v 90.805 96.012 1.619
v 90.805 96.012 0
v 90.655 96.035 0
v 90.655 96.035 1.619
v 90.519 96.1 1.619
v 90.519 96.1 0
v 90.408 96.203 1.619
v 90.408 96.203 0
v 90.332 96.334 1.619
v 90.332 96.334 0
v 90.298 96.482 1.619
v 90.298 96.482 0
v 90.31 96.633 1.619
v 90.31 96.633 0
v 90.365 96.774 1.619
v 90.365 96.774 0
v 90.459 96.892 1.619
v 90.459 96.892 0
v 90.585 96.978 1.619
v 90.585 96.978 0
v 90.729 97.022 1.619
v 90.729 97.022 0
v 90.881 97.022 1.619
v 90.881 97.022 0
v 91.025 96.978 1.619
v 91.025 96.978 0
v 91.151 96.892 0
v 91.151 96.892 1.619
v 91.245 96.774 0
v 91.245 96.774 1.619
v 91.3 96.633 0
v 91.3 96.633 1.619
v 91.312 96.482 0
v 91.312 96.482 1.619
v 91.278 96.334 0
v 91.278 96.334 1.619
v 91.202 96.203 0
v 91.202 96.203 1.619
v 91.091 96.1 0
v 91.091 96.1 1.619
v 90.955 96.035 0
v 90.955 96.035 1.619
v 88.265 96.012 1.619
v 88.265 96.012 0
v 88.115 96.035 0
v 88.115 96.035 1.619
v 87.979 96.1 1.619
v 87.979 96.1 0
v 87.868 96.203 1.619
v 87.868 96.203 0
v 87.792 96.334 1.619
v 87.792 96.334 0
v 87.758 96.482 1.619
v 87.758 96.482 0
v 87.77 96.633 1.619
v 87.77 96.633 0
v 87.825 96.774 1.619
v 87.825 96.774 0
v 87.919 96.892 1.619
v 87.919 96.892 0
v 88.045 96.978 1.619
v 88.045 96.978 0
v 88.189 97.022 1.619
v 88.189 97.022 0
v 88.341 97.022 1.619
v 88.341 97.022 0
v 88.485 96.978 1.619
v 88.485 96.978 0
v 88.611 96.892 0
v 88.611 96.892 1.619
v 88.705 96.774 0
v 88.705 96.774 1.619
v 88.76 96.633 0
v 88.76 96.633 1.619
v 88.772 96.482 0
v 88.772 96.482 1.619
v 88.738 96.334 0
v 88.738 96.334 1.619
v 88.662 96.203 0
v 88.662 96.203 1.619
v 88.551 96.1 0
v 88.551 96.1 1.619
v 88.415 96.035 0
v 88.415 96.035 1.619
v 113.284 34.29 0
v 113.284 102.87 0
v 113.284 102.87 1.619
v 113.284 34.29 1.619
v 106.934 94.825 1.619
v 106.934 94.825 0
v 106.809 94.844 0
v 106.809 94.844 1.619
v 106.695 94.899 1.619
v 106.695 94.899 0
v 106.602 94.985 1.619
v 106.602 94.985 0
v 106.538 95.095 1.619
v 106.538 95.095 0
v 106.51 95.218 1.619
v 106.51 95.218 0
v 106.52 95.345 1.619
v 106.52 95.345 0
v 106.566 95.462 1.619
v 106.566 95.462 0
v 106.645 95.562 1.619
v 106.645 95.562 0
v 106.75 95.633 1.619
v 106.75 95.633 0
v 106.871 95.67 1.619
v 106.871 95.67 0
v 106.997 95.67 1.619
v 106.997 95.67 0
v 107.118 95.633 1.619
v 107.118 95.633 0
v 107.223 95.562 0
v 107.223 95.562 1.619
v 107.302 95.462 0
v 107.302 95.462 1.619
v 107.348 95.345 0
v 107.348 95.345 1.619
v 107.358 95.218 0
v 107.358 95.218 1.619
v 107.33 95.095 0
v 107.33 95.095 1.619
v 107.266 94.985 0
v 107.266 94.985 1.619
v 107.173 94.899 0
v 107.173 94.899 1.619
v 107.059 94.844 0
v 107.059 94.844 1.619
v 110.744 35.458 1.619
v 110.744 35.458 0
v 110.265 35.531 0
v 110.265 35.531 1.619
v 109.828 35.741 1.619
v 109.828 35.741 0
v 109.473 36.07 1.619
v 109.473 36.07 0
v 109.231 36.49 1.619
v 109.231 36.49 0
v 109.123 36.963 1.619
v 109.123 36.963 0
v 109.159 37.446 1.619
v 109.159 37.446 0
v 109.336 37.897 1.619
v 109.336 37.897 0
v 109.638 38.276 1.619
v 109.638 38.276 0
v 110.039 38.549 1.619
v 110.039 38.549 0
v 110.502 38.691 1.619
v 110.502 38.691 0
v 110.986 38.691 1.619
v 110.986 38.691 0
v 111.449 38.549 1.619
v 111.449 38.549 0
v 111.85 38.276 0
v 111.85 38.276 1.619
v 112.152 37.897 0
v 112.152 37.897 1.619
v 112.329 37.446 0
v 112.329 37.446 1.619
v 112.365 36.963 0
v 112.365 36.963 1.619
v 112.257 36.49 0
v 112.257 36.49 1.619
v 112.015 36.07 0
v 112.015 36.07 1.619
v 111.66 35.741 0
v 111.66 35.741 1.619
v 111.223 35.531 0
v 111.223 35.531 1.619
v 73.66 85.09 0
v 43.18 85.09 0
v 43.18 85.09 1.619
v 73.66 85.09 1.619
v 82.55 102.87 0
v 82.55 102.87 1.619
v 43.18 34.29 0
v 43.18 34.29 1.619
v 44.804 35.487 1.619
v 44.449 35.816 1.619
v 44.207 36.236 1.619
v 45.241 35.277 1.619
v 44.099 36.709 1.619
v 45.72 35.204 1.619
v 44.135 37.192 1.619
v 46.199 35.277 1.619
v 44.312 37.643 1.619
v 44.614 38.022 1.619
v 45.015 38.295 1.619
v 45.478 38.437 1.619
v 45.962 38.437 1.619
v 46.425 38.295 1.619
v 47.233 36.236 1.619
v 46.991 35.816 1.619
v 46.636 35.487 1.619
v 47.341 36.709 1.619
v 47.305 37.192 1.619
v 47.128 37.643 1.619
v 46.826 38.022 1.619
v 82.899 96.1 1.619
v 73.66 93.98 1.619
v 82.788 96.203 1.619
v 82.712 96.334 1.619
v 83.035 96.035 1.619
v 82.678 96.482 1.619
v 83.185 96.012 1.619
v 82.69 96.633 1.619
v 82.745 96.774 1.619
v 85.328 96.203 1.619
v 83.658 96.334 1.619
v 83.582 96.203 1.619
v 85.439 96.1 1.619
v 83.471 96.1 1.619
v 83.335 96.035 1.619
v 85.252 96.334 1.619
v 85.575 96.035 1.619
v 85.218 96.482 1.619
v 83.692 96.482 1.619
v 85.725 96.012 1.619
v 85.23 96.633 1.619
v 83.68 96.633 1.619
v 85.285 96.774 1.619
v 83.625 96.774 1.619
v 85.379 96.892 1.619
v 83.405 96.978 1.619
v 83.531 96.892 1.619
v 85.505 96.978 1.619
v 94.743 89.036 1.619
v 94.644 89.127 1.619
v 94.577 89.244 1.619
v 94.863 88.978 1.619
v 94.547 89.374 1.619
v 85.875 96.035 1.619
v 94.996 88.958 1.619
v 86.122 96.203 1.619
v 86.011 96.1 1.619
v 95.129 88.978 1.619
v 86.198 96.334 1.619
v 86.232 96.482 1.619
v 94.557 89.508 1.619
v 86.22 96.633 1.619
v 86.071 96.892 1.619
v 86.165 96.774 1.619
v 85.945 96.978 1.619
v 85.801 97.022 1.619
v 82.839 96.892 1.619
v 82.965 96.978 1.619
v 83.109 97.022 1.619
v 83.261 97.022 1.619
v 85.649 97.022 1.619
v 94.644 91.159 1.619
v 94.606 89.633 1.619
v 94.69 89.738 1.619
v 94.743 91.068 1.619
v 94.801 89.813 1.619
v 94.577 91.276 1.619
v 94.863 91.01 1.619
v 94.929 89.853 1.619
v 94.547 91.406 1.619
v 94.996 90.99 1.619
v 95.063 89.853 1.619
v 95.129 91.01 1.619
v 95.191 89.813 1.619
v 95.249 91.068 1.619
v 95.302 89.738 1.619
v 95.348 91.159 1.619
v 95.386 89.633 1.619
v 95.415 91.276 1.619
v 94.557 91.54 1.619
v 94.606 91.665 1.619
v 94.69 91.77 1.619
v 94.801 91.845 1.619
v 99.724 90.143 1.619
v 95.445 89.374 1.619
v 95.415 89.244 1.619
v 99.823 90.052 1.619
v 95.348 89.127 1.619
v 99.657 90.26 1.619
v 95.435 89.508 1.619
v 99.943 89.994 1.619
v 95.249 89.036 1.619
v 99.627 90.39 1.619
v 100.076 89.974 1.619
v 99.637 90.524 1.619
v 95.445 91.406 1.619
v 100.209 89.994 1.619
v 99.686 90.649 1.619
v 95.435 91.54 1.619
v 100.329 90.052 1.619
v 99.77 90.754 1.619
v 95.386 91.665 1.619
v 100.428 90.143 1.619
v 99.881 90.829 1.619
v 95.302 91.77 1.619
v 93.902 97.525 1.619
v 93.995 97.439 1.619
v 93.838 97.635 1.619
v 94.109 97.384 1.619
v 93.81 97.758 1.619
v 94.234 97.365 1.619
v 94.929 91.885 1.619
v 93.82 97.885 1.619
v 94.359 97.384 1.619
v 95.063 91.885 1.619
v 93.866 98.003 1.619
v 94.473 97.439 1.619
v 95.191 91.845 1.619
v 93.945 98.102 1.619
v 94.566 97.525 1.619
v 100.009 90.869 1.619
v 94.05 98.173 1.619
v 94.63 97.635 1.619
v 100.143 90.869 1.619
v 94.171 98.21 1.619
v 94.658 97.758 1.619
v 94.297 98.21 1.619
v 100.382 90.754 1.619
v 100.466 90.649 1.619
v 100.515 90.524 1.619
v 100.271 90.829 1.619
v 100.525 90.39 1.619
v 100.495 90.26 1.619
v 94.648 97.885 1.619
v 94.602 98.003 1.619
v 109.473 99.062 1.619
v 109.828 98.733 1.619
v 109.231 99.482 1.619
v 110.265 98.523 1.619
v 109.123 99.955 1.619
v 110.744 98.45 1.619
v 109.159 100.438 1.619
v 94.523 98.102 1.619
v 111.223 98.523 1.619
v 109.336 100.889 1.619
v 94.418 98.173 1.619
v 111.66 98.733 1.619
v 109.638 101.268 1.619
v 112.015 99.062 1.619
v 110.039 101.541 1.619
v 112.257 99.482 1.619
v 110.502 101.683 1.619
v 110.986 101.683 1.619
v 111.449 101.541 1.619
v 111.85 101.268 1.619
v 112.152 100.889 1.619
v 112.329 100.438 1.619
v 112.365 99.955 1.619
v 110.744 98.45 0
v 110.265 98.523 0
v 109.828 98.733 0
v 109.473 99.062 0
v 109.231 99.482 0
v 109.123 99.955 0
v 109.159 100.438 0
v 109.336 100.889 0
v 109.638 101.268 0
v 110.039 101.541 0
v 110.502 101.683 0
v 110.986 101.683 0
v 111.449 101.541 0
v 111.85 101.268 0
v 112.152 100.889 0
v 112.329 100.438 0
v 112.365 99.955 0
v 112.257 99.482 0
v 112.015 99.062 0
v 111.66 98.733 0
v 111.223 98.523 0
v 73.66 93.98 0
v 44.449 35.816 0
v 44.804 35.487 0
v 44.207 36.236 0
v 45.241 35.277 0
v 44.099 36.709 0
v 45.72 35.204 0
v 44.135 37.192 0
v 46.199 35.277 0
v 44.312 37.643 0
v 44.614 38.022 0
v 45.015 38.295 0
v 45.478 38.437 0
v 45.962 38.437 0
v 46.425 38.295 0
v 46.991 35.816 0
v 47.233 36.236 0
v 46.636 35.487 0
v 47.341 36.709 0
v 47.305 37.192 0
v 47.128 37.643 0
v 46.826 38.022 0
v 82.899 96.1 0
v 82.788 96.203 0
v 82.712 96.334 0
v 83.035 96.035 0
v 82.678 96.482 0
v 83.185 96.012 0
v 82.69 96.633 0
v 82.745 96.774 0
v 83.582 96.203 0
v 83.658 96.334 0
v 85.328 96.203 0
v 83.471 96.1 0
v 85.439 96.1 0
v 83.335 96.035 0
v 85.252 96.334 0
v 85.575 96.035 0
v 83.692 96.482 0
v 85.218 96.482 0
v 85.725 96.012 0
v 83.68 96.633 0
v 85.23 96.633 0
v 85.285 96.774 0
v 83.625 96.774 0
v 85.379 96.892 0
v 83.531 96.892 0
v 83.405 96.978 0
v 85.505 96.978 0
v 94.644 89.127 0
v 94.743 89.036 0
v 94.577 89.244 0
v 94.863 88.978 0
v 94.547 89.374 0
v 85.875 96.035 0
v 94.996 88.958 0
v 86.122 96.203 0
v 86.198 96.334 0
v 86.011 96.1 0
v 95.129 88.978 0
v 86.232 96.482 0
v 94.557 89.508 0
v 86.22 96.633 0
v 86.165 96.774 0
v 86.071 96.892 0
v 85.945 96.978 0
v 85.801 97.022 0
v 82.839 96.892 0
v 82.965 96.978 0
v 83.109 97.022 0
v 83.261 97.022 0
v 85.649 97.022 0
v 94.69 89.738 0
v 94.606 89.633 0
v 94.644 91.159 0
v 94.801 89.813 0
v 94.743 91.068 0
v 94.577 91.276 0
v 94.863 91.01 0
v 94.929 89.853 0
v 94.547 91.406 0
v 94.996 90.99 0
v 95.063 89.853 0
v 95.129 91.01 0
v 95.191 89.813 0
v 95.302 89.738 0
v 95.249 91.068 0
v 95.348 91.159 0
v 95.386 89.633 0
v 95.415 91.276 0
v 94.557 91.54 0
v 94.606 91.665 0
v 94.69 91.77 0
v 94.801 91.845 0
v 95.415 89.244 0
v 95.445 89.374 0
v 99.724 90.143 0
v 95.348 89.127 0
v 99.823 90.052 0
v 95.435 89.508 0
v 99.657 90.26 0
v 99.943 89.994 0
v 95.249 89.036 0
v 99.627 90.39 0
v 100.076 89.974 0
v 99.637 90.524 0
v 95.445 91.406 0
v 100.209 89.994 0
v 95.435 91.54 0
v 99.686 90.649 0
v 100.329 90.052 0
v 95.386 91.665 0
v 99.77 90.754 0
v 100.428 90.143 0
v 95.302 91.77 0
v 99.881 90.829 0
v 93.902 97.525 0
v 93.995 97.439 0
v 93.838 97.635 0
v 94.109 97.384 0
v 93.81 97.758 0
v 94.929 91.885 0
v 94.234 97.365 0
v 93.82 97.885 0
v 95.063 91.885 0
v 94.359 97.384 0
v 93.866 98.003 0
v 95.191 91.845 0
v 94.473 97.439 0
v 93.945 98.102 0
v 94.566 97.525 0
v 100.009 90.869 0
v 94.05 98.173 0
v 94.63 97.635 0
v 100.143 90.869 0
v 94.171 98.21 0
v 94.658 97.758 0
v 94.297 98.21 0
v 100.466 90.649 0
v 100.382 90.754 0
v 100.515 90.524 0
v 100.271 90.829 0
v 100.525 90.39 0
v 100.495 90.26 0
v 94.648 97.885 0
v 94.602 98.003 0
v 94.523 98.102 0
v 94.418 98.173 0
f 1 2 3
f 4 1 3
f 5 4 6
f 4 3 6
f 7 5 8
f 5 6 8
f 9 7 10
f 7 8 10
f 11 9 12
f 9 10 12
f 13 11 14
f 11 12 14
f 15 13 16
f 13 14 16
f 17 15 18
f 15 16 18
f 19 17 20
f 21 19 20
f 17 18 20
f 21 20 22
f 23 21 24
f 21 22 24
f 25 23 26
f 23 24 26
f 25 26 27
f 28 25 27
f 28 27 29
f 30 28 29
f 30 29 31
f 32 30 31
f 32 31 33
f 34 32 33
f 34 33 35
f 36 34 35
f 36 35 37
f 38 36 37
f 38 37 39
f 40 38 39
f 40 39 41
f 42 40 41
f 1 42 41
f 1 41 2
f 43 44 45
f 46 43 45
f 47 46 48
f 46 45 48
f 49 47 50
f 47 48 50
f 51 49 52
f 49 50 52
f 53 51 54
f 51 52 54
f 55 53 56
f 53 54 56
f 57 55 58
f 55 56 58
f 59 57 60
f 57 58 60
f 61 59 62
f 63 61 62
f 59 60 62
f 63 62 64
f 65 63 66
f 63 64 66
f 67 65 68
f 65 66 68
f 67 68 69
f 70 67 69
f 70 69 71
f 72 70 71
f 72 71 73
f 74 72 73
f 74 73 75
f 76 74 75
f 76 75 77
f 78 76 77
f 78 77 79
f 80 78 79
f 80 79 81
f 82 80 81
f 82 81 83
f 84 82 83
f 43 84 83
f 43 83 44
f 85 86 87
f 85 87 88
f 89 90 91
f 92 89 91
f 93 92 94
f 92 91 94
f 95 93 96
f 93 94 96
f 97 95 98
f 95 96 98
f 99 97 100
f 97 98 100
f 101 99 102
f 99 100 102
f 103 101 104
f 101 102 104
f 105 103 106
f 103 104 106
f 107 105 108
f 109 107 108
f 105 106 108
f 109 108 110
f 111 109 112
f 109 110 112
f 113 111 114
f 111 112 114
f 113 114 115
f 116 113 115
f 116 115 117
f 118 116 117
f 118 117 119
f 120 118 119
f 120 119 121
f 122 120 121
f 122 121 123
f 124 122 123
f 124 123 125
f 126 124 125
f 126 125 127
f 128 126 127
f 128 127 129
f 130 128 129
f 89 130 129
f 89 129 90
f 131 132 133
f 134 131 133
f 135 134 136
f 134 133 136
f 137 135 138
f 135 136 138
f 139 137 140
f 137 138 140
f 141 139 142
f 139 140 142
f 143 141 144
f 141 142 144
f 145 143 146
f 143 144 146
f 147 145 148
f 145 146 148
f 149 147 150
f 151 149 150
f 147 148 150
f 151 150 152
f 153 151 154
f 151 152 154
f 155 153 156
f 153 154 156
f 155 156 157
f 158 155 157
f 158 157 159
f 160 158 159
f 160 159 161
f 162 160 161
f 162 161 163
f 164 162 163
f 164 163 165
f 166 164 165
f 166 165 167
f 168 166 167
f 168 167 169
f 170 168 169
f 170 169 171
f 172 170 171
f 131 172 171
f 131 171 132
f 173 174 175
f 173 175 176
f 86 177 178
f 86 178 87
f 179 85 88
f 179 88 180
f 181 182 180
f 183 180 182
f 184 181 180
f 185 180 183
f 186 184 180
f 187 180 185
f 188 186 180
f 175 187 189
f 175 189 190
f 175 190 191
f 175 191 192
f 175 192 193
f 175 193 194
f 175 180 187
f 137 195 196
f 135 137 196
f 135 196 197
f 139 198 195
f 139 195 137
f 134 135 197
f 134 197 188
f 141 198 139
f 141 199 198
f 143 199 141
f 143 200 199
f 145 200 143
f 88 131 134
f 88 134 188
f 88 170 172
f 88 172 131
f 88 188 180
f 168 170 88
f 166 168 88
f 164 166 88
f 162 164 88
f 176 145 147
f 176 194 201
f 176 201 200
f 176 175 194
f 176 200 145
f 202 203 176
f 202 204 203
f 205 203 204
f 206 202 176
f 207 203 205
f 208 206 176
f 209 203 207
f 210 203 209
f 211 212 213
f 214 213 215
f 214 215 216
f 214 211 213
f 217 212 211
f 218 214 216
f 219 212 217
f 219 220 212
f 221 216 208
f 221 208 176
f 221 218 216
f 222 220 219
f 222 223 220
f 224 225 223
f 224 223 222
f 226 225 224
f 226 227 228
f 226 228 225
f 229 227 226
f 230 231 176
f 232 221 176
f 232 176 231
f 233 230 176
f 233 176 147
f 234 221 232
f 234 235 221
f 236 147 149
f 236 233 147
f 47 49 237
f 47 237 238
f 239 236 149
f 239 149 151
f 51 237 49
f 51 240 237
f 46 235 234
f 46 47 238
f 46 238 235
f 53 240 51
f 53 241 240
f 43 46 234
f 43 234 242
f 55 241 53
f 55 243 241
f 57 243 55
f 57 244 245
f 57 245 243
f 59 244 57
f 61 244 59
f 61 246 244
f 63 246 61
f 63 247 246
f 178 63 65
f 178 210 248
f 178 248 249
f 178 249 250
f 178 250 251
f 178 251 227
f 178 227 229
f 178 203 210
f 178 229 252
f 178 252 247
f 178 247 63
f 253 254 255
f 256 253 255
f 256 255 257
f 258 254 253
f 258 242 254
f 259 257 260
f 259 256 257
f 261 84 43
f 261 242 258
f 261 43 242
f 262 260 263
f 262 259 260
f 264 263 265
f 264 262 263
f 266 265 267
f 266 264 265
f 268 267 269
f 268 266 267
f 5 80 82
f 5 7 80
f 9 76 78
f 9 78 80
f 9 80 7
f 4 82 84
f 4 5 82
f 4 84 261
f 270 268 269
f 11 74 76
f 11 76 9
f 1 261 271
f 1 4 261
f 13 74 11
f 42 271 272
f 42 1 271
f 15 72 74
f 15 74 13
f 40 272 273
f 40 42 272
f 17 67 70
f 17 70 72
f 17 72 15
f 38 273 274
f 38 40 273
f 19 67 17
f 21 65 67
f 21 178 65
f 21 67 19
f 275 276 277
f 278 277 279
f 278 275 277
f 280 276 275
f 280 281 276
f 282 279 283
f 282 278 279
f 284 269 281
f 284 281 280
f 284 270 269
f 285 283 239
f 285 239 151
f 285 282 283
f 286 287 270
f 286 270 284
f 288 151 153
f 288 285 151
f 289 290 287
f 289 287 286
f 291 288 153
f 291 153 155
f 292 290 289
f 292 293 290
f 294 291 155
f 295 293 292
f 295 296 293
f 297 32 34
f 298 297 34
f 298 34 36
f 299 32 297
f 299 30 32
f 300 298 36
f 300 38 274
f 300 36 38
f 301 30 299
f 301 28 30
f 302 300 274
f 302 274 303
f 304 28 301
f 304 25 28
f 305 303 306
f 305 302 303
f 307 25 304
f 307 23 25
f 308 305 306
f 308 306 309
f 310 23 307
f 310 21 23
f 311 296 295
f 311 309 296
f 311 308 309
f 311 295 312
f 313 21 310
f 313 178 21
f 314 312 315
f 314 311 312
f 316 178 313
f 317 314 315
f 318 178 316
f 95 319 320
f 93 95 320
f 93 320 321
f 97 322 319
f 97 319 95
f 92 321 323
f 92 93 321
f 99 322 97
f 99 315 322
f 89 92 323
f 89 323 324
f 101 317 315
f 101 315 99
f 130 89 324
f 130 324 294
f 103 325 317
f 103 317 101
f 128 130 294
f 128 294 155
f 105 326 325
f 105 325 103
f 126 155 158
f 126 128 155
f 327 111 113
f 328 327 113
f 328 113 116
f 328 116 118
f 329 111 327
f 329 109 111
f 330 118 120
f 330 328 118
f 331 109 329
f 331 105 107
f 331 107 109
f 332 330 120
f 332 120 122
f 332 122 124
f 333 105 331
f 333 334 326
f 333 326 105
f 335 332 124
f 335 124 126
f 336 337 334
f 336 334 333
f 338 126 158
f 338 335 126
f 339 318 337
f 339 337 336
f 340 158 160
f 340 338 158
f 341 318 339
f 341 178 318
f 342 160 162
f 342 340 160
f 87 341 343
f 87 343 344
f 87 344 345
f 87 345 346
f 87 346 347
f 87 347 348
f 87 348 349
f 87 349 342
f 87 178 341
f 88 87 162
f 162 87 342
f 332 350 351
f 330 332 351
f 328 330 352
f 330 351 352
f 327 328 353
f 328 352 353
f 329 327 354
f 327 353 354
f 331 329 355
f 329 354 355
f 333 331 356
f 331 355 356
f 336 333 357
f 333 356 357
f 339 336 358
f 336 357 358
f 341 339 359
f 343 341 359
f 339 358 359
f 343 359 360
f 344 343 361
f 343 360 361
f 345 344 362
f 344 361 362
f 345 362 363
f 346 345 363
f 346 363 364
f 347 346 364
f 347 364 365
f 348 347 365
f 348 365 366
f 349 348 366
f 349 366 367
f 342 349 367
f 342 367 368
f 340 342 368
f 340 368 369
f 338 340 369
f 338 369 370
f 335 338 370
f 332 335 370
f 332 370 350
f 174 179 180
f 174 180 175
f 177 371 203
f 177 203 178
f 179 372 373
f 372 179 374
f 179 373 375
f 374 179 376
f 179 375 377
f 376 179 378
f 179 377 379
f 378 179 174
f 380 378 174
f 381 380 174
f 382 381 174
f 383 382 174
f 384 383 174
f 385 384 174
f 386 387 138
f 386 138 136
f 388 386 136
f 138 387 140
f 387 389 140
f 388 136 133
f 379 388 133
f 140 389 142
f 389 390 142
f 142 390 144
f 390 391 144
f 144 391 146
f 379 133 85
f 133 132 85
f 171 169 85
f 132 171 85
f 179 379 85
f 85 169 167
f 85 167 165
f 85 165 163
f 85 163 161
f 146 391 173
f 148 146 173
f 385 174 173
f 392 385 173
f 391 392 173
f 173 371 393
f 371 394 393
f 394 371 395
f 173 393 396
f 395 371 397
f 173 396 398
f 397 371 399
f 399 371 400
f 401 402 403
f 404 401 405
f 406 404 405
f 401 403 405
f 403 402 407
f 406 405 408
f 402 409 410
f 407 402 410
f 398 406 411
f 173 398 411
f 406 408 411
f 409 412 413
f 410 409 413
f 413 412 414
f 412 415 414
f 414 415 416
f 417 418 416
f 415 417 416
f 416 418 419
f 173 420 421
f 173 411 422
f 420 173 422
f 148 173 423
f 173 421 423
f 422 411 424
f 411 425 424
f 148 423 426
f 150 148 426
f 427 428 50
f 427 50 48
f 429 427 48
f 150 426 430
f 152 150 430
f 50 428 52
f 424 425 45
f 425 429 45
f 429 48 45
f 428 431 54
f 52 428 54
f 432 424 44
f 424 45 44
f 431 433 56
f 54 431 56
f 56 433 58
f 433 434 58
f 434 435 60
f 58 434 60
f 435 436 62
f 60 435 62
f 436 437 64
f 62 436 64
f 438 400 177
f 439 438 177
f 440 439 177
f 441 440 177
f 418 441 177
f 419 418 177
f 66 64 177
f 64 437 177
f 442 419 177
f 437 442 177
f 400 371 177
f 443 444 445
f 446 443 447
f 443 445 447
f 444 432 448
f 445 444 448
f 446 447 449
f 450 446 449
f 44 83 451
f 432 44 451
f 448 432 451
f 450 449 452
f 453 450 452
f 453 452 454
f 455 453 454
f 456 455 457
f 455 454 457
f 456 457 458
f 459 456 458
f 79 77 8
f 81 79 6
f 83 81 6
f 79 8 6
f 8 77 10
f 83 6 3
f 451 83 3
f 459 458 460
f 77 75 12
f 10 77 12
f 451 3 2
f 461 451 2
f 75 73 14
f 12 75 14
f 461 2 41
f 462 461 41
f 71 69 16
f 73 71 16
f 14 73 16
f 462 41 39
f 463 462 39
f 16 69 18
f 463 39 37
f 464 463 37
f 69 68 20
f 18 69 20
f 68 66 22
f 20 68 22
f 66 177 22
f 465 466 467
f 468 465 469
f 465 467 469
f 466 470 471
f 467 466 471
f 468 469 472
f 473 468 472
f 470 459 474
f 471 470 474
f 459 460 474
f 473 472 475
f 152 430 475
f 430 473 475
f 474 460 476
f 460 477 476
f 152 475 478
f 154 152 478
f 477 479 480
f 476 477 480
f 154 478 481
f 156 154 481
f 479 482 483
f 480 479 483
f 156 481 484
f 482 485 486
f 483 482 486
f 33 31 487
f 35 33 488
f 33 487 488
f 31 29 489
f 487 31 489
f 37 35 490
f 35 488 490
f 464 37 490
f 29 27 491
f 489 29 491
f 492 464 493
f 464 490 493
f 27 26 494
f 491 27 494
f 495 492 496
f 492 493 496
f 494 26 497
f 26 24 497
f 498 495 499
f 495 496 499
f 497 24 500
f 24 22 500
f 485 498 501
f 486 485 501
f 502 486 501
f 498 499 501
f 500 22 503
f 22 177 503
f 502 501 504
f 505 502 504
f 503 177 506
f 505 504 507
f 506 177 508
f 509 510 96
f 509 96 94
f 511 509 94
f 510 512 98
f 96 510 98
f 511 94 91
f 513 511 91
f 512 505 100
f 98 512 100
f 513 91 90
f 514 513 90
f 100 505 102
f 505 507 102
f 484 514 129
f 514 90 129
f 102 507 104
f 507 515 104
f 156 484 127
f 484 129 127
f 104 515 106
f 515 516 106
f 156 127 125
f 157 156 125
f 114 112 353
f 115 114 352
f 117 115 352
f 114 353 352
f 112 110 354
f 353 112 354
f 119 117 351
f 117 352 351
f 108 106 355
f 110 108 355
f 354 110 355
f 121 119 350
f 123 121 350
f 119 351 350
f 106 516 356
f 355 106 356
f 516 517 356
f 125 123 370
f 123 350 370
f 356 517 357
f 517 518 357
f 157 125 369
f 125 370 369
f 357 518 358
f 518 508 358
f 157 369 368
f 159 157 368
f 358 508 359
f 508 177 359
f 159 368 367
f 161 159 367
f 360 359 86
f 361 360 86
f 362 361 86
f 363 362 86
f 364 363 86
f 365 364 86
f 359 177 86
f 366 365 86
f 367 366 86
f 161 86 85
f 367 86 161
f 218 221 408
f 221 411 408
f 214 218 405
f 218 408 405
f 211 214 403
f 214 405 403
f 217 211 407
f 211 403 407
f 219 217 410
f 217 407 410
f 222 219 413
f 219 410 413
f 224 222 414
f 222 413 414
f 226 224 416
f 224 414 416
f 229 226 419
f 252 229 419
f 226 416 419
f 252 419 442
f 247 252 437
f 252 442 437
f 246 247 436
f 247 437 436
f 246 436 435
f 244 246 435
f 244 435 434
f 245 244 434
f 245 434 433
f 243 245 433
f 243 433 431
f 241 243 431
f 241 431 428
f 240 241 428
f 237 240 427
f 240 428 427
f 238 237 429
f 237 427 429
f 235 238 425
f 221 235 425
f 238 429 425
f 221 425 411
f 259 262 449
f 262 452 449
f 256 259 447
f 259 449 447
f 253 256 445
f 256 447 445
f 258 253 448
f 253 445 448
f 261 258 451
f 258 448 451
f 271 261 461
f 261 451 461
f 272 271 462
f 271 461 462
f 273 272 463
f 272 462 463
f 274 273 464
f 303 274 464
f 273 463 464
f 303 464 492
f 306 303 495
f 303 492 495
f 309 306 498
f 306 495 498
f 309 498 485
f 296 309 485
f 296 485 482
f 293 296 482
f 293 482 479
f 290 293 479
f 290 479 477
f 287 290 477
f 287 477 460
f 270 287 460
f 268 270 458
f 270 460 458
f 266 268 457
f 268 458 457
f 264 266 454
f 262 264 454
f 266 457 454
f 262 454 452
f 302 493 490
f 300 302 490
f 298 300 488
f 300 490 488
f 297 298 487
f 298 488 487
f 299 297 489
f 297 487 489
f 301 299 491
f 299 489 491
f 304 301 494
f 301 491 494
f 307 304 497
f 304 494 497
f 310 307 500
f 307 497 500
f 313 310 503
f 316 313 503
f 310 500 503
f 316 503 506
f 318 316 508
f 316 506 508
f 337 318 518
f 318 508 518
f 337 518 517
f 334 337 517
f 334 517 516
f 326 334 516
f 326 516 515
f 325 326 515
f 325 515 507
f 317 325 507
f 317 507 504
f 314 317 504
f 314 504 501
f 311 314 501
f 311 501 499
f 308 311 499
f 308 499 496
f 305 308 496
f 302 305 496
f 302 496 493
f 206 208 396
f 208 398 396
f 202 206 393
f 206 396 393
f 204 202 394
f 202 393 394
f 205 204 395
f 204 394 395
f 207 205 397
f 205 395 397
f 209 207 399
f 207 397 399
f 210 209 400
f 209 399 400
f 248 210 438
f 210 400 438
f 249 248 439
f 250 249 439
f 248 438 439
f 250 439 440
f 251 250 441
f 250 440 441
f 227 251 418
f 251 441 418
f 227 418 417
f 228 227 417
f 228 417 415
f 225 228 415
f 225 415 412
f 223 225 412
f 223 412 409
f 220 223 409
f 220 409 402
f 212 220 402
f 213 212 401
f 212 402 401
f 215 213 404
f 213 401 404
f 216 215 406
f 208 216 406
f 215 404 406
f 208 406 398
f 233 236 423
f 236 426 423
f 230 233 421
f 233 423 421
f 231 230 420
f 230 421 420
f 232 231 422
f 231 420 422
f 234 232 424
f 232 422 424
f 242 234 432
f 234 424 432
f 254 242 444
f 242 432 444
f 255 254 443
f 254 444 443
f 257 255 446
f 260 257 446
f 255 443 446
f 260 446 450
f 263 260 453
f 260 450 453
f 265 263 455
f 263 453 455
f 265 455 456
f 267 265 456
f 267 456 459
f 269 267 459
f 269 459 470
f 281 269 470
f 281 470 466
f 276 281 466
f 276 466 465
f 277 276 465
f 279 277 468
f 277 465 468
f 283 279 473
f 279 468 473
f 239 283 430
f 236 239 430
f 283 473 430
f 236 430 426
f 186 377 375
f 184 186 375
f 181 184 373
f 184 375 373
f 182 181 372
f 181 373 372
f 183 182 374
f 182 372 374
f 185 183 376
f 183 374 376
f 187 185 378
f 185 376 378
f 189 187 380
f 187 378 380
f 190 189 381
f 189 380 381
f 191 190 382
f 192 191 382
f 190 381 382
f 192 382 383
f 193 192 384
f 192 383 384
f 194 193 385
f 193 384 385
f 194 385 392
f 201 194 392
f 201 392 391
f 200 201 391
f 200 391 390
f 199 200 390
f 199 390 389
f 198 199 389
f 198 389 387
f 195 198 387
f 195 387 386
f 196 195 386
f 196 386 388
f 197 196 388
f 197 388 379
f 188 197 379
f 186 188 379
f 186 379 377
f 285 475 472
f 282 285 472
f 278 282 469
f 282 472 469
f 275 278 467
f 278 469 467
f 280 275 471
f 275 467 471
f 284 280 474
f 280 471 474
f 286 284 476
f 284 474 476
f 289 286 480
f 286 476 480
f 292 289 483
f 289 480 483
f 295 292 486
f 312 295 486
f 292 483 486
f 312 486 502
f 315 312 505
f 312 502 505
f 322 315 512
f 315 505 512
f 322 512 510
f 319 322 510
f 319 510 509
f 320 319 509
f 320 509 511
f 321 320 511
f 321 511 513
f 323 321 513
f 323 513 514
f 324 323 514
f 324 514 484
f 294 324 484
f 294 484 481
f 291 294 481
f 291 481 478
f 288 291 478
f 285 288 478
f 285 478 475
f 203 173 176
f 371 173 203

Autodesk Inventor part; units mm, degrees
ref_plane "YZ Plane" through (0, 0, 0) normal (1, 0, 0) x (0, 1, 0)
ref_plane "XZ Plane" through (0, 0, 0) normal (0, 1, 0) x (-1, 0, 0)
ref_plane "BoardFrontPlane" through (0, 0, 0) normal (0, 0, 1) x (1, 0, 0)
sketch "Sketch1" plane through (0, 0, 0) normal (0, 0, 1) x (1, 0, 0)
  line L0 (43.18, 34.29) -> (43.18, 85.09)
  line L1 (43.18, 85.09) -> (73.66, 85.09)
  line L2 (73.66, 85.09) -> (73.66, 93.98)
  line L3 (73.66, 93.98) -> (82.55, 102.87)
  line L4 (82.55, 102.87) -> (113.284, 102.87)
  line L5 (113.284, 102.87) -> (113.284, 34.29)
  line L6 (113.284, 34.29) -> (43.18, 34.29)
extrude "BoardOutline" add sketch "Sketch1" along normal blind 1.6194
sketch "img_Top" plane through (0, 0, 1.6194) normal (0, 0, 1) x (1, 0, 0)
  line L0 (43.18, 102.87) -> (113.284, 102.87) construction
  line L1 (113.284, 102.87) -> (113.284, 34.29) construction
  line L2 (113.284, 34.29) -> (43.18, 34.29) construction
  line L3 (43.18, 34.29) -> (43.18, 102.87) construction
decal "Decal_Top"
sketch "img_Bottom" plane through (0, 0, -1.6194) normal (0, 0, -1) x (1, 0, 0)
  line L0 (43.18, -34.29) -> (113.284, -34.29) construction
  line L1 (113.284, -34.29) -> (113.284, -102.87) construction
  line L2 (113.284, -102.87) -> (43.18, -102.87) construction
  line L3 (43.18, -102.87) -> (43.18, -34.29) construction
decal "Decal_Bottom"
sketch "Sketch4" plane through (0, 0, 1.6194) normal (0, 0, 1) x (1, 0, 0)
  point P0 (94.234, 97.79)
hole "SW301-H1" at (94.234, 97.79, 1.6194) direction (0, 0, -1) diameter 0.85 end through all
sketch "Sketch5" plane through (0, 0, 1.6194) normal (0, 0, 1) x (1, 0, 0)
  point P0 (106.934, 95.25)
hole "SW300-H1" at (106.934, 95.25, 1.6194) direction (0, 0, -1) diameter 0.85 end through all
sketch "Sketch6" plane through (0, 0, 1.6194) normal (0, 0, 1) x (1, 0, 0)
  point P0 (45.72, 36.83)
hole "Free-MNT+4" at (45.72, 36.83, 1.6194) direction (0, 0, -1) diameter 3.2512 end through all
sketch "Sketch7" plane through (0, 0, 1.6194) normal (0, 0, 1) x (1, 0, 0)
  point P0 (110.744, 37.084)
hole "Free-MNT+3" at (110.744, 37.084, 1.6194) direction (0, 0, -1) diameter 3.2512 end through all
sketch "Sketch8" plane through (0, 0, 1.6194) normal (0, 0, 1) x (1, 0, 0)
  point P0 (110.744, 100.076)
hole "Free-MNT+2" at (110.744, 100.076, 1.6194) direction (0, 0, -1) diameter 3.2512 end through all
sketch "Sketch9" plane through (0, 0, 1.6194) normal (0, 0, 1) x (1, 0, 0)
  point P0 (90.805, 96.52)
hole "JP300-1" at (90.805, 96.52, 1.6194) direction (0, 0, -1) diameter 1.016 end through all
sketch "Sketch10" plane through (0, 0, 1.6194) normal (0, 0, 1) x (1, 0, 0)
  point P0 (88.265, 96.52)
hole "JP300-2" at (88.265, 96.52, 1.6194) direction (0, 0, -1) diameter 1.016 end through all
sketch "Sketch11" plane through (0, 0, 1.6194) normal (0, 0, 1) x (1, 0, 0)
  point P0 (85.725, 96.52)
hole "JP300-3" at (85.725, 96.52, 1.6194) direction (0, 0, -1) diameter 1.016 end through all
sketch "Sketch12" plane through (0, 0, 1.6194) normal (0, 0, 1) x (1, 0, 0)
  point P0 (83.185, 96.52)
hole "JP300-4" at (83.185, 96.52, 1.6194) direction (0, 0, -1) diameter 1.016 end through all
sketch "Sketch13" plane through (0, 0, 1.6194) normal (0, 0, 1) x (1, 0, 0)
  point P0 (94.996, 91.44)
hole "J300-_OMJMIDLA" at (94.996, 91.44, 1.6194) direction (0, 0, -1) diameter 0.9 end through all
sketch "Sketch14" plane through (0, 0, 1.6194) normal (0, 0, 1) x (1, 0, 0)
  point P0 (94.996, 89.408)
hole "J300-_YAKUTFXJ" at (94.996, 89.408, 1.6194) direction (0, 0, -1) diameter 0.9 end through all
sketch "Sketch15" plane through (0, 0, 1.6194) normal (0, 0, 1) x (1, 0, 0)
  point P0 (100.076, 90.424)
hole "J300-_MBXSYRVB" at (100.076, 90.424, 1.6194) direction (0, 0, -1) diameter 0.9 end through all
properties part number "skimmer_swabbie_v1_BOARD"
